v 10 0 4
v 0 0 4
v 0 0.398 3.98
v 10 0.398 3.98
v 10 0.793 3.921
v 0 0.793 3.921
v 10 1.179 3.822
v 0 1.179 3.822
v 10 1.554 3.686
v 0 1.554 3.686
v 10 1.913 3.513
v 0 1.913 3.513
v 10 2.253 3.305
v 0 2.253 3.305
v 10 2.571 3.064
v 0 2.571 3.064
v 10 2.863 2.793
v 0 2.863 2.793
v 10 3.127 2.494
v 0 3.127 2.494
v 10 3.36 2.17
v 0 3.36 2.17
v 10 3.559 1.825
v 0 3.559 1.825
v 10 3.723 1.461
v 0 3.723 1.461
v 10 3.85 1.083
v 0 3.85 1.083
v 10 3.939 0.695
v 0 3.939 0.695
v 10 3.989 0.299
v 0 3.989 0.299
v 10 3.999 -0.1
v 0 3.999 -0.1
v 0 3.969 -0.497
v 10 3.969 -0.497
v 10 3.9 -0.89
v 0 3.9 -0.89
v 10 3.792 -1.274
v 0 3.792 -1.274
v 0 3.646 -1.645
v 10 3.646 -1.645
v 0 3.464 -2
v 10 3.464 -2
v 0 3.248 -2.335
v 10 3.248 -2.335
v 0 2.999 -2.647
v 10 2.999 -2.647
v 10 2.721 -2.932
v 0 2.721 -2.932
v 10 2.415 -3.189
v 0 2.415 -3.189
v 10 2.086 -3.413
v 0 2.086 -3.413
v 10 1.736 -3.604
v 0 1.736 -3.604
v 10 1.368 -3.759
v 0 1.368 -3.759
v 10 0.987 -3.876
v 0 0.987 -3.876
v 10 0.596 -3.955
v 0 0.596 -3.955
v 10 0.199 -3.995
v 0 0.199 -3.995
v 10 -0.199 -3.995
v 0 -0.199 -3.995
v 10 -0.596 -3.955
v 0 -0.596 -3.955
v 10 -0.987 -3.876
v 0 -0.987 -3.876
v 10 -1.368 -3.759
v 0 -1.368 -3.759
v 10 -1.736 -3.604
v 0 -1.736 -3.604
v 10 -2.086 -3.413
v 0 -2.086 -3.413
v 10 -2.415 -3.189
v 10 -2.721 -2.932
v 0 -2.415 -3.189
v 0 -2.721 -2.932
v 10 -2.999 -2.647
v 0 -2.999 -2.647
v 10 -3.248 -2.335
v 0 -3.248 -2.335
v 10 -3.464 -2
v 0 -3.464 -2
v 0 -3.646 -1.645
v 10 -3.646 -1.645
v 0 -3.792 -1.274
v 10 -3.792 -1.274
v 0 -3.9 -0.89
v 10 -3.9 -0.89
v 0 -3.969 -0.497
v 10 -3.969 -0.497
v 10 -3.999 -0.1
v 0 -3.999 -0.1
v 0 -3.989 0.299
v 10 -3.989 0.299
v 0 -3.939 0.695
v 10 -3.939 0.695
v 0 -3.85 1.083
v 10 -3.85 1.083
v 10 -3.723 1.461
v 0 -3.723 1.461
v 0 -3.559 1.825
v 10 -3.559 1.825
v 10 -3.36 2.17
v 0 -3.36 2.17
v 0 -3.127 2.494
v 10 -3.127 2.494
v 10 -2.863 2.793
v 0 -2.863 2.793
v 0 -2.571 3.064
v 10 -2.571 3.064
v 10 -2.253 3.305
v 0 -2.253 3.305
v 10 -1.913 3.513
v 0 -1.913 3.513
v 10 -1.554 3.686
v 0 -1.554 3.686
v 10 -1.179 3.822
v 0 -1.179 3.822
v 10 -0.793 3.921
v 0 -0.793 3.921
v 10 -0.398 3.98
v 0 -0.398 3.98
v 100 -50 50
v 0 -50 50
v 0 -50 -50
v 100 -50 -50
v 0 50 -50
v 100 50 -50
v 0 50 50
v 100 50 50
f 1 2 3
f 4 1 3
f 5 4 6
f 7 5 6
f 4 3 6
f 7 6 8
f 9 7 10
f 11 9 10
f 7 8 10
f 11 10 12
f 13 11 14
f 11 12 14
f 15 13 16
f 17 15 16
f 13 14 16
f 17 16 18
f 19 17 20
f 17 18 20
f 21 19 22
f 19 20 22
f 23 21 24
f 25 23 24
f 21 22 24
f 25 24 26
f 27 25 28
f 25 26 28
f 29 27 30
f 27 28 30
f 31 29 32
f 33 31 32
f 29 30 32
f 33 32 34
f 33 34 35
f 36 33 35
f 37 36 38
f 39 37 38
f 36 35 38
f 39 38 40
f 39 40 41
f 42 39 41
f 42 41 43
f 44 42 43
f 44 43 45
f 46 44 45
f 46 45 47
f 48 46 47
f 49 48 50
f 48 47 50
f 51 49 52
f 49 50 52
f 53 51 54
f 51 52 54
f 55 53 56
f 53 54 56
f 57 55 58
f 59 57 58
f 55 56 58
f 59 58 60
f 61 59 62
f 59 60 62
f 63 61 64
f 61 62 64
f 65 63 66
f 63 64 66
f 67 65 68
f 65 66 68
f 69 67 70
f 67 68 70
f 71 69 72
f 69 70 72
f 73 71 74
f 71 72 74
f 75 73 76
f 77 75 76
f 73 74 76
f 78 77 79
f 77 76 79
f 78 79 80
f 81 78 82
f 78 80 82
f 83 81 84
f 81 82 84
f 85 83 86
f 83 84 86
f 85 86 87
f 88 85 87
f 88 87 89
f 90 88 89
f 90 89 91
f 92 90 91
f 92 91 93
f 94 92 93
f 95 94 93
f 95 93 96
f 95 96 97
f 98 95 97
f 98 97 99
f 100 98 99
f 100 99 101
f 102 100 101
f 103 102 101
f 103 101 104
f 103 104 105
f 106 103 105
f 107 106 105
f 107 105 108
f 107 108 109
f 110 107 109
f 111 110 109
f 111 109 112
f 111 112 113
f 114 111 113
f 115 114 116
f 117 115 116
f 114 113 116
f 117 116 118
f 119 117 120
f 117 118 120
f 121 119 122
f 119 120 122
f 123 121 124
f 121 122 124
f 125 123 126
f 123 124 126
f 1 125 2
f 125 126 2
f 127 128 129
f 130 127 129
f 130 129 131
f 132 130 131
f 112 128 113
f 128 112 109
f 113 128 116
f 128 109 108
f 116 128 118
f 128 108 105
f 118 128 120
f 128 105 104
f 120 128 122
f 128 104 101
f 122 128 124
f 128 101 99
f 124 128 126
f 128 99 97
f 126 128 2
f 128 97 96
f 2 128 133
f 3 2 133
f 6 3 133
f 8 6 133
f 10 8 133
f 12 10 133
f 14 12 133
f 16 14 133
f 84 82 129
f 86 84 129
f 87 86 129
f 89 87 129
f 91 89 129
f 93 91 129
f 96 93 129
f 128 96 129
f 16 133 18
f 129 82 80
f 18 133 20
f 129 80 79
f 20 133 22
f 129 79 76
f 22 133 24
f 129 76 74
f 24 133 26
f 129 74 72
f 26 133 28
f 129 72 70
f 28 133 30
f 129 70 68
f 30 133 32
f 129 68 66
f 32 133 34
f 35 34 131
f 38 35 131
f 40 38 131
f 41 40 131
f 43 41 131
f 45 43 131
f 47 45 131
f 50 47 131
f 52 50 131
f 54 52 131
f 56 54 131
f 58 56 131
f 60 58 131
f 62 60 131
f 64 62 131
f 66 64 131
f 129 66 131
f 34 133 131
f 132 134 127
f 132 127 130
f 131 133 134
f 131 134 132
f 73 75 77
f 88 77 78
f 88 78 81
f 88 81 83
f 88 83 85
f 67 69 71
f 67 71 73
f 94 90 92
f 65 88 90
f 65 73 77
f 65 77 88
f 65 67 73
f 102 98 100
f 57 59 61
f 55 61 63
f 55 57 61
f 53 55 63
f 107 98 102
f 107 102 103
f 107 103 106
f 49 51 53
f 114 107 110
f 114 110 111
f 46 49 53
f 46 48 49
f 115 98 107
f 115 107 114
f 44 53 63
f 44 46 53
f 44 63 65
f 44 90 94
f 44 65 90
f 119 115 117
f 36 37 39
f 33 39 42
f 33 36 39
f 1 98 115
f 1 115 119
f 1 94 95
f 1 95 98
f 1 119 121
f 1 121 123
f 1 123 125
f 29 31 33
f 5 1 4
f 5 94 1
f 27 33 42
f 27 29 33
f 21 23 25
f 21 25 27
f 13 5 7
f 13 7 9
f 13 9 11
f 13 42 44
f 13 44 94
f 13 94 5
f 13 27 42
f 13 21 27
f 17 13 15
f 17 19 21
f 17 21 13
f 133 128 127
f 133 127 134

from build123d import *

# Parameters (mm, degrees)
SKETCH1_W           = 100
SKETCH1_H           = 100
BOSS_EXTRUDE1_DEPTH = 100
SKETCH2_R           = 4
CUT_EXTRUDE1_DEPTH  = 10


with BuildPart() as part:
    # Sketch1 → Boss-Extrude1 (new body)
    with BuildSketch(Plane(origin=(0, 0, 0), x_dir=(0, 0, -1), z_dir=(1, 0, 0))):
        Rectangle(SKETCH1_W, SKETCH1_H)
    extrude(amount=BOSS_EXTRUDE1_DEPTH)

    # Sketch2 → Cut-Extrude1 (cut)
    with BuildSketch(Plane.ZY):
        Circle(SKETCH2_R)
    extrude(amount=-CUT_EXTRUDE1_DEPTH, mode=Mode.SUBTRACT)


solid = part.part
